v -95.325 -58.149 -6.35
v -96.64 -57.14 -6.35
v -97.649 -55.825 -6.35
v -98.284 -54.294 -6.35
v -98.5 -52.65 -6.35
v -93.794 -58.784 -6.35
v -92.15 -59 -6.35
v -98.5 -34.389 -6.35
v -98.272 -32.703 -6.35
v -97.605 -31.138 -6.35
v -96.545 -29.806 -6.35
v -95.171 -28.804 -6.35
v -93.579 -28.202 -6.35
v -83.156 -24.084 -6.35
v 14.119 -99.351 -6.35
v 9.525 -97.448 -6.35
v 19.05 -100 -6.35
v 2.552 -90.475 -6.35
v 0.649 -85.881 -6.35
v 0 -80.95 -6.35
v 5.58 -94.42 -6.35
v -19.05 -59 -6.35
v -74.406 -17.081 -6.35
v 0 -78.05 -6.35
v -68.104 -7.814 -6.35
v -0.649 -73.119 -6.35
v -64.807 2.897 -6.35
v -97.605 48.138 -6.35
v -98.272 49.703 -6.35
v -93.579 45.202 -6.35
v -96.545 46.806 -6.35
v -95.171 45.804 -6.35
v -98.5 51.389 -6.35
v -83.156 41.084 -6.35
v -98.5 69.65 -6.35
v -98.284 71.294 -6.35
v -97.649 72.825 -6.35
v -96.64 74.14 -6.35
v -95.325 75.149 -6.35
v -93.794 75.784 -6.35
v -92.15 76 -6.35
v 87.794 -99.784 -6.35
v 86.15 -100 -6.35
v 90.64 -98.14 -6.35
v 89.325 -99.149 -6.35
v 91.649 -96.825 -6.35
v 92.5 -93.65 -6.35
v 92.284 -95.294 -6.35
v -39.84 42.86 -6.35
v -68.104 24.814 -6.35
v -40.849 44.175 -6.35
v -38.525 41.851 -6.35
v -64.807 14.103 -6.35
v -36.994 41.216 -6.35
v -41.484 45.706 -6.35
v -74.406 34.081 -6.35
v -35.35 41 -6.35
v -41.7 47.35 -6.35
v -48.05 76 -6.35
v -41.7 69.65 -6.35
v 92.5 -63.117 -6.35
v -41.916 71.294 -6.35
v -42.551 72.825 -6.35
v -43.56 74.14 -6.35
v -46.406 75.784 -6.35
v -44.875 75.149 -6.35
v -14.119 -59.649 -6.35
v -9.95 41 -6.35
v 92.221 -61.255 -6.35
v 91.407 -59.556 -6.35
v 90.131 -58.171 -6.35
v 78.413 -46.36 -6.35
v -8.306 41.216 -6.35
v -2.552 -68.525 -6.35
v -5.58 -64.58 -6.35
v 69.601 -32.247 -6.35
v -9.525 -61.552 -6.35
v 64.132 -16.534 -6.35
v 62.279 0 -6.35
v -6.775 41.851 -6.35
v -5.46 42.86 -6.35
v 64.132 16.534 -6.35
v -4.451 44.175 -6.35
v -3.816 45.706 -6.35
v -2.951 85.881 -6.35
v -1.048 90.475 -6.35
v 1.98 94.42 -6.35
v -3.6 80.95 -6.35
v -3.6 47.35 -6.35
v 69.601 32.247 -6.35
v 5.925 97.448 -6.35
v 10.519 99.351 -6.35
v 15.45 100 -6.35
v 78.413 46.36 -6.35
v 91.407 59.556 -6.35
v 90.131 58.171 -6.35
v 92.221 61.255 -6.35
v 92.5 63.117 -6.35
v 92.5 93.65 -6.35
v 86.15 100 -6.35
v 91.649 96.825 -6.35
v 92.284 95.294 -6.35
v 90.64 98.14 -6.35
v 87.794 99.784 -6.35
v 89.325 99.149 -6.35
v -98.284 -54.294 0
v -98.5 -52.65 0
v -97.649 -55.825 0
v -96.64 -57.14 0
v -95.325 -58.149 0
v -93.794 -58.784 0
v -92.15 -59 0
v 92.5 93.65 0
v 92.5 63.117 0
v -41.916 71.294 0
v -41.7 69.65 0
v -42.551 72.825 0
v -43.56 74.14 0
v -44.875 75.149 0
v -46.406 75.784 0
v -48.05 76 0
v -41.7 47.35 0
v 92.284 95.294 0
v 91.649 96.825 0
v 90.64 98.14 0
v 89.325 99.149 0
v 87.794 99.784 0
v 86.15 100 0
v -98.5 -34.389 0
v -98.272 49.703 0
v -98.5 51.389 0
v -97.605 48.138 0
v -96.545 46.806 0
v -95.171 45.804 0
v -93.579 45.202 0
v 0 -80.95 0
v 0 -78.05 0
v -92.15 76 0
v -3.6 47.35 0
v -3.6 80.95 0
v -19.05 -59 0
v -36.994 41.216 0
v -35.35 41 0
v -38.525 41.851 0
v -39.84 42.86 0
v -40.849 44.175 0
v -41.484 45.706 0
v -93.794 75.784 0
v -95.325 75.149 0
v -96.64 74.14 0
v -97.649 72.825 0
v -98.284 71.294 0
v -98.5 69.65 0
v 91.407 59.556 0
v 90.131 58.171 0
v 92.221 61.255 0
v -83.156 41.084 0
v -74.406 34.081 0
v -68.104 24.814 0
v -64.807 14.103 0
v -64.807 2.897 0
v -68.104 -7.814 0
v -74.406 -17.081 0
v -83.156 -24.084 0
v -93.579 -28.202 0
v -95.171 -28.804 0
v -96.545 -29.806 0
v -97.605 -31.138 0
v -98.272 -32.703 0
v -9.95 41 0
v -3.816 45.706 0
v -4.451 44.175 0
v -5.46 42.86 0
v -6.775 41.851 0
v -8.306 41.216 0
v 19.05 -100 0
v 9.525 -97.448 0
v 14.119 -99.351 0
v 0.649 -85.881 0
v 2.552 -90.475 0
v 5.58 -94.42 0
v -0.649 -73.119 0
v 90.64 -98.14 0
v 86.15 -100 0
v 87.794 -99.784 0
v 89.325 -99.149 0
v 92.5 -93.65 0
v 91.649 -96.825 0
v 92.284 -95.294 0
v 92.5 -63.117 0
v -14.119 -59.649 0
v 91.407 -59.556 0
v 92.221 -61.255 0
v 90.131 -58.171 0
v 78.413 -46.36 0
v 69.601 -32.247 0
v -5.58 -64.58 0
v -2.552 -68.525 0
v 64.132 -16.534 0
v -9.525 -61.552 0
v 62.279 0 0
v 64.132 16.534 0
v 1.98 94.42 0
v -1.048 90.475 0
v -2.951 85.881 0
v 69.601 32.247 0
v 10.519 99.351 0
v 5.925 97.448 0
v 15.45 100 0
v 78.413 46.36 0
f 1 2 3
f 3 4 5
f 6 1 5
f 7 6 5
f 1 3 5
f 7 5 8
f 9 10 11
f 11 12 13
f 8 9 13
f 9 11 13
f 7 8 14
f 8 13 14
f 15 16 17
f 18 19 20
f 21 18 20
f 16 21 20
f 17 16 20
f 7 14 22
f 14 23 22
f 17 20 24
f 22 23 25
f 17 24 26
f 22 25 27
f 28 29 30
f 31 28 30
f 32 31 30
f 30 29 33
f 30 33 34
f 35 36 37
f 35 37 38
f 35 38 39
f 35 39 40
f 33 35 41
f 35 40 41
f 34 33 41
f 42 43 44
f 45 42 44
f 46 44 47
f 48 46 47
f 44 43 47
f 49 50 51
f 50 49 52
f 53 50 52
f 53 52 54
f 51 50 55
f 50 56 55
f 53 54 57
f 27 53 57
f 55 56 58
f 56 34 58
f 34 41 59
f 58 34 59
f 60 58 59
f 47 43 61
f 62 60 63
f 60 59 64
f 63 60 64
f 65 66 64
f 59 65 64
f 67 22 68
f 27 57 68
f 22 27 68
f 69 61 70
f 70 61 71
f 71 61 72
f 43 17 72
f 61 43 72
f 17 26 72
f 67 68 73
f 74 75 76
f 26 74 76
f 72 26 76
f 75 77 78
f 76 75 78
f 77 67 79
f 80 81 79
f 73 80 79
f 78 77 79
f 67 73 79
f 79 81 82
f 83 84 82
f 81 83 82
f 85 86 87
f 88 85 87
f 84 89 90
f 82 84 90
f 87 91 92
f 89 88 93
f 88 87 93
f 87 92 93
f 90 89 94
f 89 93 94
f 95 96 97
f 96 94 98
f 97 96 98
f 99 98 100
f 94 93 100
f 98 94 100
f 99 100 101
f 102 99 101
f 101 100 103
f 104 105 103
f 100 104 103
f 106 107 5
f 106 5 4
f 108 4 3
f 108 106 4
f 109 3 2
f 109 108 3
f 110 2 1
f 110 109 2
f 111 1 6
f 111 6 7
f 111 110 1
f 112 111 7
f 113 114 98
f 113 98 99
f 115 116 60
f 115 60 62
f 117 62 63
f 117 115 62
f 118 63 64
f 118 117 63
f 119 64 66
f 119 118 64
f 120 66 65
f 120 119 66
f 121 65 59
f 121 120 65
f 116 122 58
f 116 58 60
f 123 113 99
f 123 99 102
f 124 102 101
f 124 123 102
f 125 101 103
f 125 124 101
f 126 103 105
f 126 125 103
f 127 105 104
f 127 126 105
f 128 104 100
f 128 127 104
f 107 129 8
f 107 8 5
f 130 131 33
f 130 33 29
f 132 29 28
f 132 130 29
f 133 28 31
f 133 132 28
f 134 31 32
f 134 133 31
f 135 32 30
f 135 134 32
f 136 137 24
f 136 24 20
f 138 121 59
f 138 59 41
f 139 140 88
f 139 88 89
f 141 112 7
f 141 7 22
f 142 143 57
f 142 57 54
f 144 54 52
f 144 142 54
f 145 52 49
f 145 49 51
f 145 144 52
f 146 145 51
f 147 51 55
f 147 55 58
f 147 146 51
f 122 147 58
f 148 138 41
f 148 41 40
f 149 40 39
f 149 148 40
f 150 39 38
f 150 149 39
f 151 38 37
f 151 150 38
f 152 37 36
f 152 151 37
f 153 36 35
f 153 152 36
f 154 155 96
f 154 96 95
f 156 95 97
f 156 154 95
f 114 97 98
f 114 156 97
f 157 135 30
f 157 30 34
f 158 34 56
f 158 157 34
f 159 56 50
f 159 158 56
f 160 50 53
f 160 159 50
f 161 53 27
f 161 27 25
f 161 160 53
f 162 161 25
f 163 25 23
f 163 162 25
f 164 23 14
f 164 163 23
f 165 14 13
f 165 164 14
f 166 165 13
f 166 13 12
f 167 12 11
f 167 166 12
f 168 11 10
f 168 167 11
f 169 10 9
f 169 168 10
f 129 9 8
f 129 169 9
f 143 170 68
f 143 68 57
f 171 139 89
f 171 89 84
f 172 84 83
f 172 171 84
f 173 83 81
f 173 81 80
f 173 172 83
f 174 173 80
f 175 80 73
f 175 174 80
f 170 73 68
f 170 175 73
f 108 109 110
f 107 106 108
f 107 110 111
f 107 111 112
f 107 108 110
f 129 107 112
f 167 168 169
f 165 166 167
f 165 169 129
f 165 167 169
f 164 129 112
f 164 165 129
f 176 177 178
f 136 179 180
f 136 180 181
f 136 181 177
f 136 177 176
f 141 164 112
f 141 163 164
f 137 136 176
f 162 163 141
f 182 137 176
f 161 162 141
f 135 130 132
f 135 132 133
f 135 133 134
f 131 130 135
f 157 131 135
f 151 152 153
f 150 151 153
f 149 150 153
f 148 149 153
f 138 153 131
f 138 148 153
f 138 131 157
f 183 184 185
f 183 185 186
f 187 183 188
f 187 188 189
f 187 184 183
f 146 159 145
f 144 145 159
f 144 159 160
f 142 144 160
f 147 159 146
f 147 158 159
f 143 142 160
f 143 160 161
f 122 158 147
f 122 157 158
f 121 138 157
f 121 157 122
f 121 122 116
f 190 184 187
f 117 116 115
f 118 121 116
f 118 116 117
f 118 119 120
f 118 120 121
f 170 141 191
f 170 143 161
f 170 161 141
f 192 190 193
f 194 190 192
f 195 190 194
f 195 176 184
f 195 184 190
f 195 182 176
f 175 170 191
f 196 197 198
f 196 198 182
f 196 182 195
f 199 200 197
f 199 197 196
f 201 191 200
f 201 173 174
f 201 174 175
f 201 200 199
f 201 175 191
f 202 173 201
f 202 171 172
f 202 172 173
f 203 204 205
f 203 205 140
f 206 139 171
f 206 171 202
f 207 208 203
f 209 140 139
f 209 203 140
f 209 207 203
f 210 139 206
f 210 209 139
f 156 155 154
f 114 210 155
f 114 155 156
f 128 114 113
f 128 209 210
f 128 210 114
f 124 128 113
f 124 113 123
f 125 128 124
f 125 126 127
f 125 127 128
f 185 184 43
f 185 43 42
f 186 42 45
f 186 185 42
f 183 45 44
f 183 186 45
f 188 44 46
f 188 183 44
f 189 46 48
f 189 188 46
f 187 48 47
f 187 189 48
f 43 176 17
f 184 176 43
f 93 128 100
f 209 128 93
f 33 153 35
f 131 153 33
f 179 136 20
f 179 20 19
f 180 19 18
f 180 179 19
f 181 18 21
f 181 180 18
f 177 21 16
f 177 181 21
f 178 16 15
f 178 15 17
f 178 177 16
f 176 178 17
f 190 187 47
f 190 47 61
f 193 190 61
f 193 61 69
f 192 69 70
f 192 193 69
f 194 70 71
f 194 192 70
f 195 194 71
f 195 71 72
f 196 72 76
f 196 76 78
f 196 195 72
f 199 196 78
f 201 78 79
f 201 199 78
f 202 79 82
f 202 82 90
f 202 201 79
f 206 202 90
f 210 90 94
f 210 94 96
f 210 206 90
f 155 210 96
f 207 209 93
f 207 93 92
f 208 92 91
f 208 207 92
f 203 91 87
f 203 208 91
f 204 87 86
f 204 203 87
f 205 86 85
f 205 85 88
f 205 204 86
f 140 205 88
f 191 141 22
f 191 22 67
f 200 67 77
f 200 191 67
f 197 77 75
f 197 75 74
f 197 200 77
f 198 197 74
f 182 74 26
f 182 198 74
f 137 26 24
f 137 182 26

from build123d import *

# Parameters (mm, degrees)
F1_DEPTH = 6.35


with BuildPart() as f1:
    # F0 (on Top) → F1 (new body)
    with BuildSketch(Plane.XY):
        with BuildLine():
            ThreePointArc((-98.5, -52.65), (-96.640128, -57.140128), (-92.15, -59))
            Line((-92.15, -59), (-19.05, -59))
            ThreePointArc((-19.05, -59), (-5.579616, -64.579616), (0, -78.05))
            Line((0, -78.05), (0, -80.95))
            ThreePointArc((0, -80.95), (5.579616, -94.420384), (19.05, -100))
            Line((19.05, -100), (86.15, -100))
            ThreePointArc((86.15, -100), (90.640128, -98.140128), (92.5, -93.65))
            Line((92.5, -93.65), (92.5, -63.117434))
            ThreePointArc((92.5, -63.117434), (91.877326, -60.375129), (90.131422, -58.170639))
            ThreePointArc((90.131422, -58.170639), (62.278704, 0), (90.131422, 58.170639))
            ThreePointArc((90.131422, 58.170639), (91.877326, 60.375129), (92.5, 63.117434))
            Line((92.5, 63.117434), (92.5, 93.65))
            ThreePointArc((92.5, 93.65), (90.640128, 98.140128), (86.15, 100))
            Line((86.15, 100), (15.45, 100))
            ThreePointArc((15.45, 100), (1.979616, 94.420384), (-3.6, 80.95))
            Line((-3.6, 80.95), (-3.6, 76))
            Line((-3.6, 76), (-3.6, 47.35))
            ThreePointArc((-3.6, 47.35), (-5.459872, 42.859872), (-9.95, 41))
            Line((-9.95, 41), (-35.35, 41))
            ThreePointArc((-35.35, 41), (-39.840128, 42.859872), (-41.7, 47.35))
            Line((-41.7, 47.35), (-41.7, 69.65))
            ThreePointArc((-41.7, 69.65), (-43.559872, 74.140128), (-48.05, 76))
            Line((-48.05, 76), (-92.15, 76))
            ThreePointArc((-92.15, 76), (-96.640128, 74.140128), (-98.5, 69.65))
            Line((-98.5, 69.65), (-98.5, 51.389104))
            ThreePointArc((-98.5, 51.389104), (-97.119749, 47.436371), (-93.579024, 45.201989))
            ThreePointArc((-93.579024, 45.201989), (-64.387776, 8.5), (-93.579024, -28.201989))
            ThreePointArc((-93.579024, -28.201989), (-97.119749, -30.436371), (-98.5, -34.389104))
            Line((-98.5, -34.389104), (-98.5, -52.65))
        make_face()
    extrude(amount=-F1_DEPTH)


solid = f1.part
